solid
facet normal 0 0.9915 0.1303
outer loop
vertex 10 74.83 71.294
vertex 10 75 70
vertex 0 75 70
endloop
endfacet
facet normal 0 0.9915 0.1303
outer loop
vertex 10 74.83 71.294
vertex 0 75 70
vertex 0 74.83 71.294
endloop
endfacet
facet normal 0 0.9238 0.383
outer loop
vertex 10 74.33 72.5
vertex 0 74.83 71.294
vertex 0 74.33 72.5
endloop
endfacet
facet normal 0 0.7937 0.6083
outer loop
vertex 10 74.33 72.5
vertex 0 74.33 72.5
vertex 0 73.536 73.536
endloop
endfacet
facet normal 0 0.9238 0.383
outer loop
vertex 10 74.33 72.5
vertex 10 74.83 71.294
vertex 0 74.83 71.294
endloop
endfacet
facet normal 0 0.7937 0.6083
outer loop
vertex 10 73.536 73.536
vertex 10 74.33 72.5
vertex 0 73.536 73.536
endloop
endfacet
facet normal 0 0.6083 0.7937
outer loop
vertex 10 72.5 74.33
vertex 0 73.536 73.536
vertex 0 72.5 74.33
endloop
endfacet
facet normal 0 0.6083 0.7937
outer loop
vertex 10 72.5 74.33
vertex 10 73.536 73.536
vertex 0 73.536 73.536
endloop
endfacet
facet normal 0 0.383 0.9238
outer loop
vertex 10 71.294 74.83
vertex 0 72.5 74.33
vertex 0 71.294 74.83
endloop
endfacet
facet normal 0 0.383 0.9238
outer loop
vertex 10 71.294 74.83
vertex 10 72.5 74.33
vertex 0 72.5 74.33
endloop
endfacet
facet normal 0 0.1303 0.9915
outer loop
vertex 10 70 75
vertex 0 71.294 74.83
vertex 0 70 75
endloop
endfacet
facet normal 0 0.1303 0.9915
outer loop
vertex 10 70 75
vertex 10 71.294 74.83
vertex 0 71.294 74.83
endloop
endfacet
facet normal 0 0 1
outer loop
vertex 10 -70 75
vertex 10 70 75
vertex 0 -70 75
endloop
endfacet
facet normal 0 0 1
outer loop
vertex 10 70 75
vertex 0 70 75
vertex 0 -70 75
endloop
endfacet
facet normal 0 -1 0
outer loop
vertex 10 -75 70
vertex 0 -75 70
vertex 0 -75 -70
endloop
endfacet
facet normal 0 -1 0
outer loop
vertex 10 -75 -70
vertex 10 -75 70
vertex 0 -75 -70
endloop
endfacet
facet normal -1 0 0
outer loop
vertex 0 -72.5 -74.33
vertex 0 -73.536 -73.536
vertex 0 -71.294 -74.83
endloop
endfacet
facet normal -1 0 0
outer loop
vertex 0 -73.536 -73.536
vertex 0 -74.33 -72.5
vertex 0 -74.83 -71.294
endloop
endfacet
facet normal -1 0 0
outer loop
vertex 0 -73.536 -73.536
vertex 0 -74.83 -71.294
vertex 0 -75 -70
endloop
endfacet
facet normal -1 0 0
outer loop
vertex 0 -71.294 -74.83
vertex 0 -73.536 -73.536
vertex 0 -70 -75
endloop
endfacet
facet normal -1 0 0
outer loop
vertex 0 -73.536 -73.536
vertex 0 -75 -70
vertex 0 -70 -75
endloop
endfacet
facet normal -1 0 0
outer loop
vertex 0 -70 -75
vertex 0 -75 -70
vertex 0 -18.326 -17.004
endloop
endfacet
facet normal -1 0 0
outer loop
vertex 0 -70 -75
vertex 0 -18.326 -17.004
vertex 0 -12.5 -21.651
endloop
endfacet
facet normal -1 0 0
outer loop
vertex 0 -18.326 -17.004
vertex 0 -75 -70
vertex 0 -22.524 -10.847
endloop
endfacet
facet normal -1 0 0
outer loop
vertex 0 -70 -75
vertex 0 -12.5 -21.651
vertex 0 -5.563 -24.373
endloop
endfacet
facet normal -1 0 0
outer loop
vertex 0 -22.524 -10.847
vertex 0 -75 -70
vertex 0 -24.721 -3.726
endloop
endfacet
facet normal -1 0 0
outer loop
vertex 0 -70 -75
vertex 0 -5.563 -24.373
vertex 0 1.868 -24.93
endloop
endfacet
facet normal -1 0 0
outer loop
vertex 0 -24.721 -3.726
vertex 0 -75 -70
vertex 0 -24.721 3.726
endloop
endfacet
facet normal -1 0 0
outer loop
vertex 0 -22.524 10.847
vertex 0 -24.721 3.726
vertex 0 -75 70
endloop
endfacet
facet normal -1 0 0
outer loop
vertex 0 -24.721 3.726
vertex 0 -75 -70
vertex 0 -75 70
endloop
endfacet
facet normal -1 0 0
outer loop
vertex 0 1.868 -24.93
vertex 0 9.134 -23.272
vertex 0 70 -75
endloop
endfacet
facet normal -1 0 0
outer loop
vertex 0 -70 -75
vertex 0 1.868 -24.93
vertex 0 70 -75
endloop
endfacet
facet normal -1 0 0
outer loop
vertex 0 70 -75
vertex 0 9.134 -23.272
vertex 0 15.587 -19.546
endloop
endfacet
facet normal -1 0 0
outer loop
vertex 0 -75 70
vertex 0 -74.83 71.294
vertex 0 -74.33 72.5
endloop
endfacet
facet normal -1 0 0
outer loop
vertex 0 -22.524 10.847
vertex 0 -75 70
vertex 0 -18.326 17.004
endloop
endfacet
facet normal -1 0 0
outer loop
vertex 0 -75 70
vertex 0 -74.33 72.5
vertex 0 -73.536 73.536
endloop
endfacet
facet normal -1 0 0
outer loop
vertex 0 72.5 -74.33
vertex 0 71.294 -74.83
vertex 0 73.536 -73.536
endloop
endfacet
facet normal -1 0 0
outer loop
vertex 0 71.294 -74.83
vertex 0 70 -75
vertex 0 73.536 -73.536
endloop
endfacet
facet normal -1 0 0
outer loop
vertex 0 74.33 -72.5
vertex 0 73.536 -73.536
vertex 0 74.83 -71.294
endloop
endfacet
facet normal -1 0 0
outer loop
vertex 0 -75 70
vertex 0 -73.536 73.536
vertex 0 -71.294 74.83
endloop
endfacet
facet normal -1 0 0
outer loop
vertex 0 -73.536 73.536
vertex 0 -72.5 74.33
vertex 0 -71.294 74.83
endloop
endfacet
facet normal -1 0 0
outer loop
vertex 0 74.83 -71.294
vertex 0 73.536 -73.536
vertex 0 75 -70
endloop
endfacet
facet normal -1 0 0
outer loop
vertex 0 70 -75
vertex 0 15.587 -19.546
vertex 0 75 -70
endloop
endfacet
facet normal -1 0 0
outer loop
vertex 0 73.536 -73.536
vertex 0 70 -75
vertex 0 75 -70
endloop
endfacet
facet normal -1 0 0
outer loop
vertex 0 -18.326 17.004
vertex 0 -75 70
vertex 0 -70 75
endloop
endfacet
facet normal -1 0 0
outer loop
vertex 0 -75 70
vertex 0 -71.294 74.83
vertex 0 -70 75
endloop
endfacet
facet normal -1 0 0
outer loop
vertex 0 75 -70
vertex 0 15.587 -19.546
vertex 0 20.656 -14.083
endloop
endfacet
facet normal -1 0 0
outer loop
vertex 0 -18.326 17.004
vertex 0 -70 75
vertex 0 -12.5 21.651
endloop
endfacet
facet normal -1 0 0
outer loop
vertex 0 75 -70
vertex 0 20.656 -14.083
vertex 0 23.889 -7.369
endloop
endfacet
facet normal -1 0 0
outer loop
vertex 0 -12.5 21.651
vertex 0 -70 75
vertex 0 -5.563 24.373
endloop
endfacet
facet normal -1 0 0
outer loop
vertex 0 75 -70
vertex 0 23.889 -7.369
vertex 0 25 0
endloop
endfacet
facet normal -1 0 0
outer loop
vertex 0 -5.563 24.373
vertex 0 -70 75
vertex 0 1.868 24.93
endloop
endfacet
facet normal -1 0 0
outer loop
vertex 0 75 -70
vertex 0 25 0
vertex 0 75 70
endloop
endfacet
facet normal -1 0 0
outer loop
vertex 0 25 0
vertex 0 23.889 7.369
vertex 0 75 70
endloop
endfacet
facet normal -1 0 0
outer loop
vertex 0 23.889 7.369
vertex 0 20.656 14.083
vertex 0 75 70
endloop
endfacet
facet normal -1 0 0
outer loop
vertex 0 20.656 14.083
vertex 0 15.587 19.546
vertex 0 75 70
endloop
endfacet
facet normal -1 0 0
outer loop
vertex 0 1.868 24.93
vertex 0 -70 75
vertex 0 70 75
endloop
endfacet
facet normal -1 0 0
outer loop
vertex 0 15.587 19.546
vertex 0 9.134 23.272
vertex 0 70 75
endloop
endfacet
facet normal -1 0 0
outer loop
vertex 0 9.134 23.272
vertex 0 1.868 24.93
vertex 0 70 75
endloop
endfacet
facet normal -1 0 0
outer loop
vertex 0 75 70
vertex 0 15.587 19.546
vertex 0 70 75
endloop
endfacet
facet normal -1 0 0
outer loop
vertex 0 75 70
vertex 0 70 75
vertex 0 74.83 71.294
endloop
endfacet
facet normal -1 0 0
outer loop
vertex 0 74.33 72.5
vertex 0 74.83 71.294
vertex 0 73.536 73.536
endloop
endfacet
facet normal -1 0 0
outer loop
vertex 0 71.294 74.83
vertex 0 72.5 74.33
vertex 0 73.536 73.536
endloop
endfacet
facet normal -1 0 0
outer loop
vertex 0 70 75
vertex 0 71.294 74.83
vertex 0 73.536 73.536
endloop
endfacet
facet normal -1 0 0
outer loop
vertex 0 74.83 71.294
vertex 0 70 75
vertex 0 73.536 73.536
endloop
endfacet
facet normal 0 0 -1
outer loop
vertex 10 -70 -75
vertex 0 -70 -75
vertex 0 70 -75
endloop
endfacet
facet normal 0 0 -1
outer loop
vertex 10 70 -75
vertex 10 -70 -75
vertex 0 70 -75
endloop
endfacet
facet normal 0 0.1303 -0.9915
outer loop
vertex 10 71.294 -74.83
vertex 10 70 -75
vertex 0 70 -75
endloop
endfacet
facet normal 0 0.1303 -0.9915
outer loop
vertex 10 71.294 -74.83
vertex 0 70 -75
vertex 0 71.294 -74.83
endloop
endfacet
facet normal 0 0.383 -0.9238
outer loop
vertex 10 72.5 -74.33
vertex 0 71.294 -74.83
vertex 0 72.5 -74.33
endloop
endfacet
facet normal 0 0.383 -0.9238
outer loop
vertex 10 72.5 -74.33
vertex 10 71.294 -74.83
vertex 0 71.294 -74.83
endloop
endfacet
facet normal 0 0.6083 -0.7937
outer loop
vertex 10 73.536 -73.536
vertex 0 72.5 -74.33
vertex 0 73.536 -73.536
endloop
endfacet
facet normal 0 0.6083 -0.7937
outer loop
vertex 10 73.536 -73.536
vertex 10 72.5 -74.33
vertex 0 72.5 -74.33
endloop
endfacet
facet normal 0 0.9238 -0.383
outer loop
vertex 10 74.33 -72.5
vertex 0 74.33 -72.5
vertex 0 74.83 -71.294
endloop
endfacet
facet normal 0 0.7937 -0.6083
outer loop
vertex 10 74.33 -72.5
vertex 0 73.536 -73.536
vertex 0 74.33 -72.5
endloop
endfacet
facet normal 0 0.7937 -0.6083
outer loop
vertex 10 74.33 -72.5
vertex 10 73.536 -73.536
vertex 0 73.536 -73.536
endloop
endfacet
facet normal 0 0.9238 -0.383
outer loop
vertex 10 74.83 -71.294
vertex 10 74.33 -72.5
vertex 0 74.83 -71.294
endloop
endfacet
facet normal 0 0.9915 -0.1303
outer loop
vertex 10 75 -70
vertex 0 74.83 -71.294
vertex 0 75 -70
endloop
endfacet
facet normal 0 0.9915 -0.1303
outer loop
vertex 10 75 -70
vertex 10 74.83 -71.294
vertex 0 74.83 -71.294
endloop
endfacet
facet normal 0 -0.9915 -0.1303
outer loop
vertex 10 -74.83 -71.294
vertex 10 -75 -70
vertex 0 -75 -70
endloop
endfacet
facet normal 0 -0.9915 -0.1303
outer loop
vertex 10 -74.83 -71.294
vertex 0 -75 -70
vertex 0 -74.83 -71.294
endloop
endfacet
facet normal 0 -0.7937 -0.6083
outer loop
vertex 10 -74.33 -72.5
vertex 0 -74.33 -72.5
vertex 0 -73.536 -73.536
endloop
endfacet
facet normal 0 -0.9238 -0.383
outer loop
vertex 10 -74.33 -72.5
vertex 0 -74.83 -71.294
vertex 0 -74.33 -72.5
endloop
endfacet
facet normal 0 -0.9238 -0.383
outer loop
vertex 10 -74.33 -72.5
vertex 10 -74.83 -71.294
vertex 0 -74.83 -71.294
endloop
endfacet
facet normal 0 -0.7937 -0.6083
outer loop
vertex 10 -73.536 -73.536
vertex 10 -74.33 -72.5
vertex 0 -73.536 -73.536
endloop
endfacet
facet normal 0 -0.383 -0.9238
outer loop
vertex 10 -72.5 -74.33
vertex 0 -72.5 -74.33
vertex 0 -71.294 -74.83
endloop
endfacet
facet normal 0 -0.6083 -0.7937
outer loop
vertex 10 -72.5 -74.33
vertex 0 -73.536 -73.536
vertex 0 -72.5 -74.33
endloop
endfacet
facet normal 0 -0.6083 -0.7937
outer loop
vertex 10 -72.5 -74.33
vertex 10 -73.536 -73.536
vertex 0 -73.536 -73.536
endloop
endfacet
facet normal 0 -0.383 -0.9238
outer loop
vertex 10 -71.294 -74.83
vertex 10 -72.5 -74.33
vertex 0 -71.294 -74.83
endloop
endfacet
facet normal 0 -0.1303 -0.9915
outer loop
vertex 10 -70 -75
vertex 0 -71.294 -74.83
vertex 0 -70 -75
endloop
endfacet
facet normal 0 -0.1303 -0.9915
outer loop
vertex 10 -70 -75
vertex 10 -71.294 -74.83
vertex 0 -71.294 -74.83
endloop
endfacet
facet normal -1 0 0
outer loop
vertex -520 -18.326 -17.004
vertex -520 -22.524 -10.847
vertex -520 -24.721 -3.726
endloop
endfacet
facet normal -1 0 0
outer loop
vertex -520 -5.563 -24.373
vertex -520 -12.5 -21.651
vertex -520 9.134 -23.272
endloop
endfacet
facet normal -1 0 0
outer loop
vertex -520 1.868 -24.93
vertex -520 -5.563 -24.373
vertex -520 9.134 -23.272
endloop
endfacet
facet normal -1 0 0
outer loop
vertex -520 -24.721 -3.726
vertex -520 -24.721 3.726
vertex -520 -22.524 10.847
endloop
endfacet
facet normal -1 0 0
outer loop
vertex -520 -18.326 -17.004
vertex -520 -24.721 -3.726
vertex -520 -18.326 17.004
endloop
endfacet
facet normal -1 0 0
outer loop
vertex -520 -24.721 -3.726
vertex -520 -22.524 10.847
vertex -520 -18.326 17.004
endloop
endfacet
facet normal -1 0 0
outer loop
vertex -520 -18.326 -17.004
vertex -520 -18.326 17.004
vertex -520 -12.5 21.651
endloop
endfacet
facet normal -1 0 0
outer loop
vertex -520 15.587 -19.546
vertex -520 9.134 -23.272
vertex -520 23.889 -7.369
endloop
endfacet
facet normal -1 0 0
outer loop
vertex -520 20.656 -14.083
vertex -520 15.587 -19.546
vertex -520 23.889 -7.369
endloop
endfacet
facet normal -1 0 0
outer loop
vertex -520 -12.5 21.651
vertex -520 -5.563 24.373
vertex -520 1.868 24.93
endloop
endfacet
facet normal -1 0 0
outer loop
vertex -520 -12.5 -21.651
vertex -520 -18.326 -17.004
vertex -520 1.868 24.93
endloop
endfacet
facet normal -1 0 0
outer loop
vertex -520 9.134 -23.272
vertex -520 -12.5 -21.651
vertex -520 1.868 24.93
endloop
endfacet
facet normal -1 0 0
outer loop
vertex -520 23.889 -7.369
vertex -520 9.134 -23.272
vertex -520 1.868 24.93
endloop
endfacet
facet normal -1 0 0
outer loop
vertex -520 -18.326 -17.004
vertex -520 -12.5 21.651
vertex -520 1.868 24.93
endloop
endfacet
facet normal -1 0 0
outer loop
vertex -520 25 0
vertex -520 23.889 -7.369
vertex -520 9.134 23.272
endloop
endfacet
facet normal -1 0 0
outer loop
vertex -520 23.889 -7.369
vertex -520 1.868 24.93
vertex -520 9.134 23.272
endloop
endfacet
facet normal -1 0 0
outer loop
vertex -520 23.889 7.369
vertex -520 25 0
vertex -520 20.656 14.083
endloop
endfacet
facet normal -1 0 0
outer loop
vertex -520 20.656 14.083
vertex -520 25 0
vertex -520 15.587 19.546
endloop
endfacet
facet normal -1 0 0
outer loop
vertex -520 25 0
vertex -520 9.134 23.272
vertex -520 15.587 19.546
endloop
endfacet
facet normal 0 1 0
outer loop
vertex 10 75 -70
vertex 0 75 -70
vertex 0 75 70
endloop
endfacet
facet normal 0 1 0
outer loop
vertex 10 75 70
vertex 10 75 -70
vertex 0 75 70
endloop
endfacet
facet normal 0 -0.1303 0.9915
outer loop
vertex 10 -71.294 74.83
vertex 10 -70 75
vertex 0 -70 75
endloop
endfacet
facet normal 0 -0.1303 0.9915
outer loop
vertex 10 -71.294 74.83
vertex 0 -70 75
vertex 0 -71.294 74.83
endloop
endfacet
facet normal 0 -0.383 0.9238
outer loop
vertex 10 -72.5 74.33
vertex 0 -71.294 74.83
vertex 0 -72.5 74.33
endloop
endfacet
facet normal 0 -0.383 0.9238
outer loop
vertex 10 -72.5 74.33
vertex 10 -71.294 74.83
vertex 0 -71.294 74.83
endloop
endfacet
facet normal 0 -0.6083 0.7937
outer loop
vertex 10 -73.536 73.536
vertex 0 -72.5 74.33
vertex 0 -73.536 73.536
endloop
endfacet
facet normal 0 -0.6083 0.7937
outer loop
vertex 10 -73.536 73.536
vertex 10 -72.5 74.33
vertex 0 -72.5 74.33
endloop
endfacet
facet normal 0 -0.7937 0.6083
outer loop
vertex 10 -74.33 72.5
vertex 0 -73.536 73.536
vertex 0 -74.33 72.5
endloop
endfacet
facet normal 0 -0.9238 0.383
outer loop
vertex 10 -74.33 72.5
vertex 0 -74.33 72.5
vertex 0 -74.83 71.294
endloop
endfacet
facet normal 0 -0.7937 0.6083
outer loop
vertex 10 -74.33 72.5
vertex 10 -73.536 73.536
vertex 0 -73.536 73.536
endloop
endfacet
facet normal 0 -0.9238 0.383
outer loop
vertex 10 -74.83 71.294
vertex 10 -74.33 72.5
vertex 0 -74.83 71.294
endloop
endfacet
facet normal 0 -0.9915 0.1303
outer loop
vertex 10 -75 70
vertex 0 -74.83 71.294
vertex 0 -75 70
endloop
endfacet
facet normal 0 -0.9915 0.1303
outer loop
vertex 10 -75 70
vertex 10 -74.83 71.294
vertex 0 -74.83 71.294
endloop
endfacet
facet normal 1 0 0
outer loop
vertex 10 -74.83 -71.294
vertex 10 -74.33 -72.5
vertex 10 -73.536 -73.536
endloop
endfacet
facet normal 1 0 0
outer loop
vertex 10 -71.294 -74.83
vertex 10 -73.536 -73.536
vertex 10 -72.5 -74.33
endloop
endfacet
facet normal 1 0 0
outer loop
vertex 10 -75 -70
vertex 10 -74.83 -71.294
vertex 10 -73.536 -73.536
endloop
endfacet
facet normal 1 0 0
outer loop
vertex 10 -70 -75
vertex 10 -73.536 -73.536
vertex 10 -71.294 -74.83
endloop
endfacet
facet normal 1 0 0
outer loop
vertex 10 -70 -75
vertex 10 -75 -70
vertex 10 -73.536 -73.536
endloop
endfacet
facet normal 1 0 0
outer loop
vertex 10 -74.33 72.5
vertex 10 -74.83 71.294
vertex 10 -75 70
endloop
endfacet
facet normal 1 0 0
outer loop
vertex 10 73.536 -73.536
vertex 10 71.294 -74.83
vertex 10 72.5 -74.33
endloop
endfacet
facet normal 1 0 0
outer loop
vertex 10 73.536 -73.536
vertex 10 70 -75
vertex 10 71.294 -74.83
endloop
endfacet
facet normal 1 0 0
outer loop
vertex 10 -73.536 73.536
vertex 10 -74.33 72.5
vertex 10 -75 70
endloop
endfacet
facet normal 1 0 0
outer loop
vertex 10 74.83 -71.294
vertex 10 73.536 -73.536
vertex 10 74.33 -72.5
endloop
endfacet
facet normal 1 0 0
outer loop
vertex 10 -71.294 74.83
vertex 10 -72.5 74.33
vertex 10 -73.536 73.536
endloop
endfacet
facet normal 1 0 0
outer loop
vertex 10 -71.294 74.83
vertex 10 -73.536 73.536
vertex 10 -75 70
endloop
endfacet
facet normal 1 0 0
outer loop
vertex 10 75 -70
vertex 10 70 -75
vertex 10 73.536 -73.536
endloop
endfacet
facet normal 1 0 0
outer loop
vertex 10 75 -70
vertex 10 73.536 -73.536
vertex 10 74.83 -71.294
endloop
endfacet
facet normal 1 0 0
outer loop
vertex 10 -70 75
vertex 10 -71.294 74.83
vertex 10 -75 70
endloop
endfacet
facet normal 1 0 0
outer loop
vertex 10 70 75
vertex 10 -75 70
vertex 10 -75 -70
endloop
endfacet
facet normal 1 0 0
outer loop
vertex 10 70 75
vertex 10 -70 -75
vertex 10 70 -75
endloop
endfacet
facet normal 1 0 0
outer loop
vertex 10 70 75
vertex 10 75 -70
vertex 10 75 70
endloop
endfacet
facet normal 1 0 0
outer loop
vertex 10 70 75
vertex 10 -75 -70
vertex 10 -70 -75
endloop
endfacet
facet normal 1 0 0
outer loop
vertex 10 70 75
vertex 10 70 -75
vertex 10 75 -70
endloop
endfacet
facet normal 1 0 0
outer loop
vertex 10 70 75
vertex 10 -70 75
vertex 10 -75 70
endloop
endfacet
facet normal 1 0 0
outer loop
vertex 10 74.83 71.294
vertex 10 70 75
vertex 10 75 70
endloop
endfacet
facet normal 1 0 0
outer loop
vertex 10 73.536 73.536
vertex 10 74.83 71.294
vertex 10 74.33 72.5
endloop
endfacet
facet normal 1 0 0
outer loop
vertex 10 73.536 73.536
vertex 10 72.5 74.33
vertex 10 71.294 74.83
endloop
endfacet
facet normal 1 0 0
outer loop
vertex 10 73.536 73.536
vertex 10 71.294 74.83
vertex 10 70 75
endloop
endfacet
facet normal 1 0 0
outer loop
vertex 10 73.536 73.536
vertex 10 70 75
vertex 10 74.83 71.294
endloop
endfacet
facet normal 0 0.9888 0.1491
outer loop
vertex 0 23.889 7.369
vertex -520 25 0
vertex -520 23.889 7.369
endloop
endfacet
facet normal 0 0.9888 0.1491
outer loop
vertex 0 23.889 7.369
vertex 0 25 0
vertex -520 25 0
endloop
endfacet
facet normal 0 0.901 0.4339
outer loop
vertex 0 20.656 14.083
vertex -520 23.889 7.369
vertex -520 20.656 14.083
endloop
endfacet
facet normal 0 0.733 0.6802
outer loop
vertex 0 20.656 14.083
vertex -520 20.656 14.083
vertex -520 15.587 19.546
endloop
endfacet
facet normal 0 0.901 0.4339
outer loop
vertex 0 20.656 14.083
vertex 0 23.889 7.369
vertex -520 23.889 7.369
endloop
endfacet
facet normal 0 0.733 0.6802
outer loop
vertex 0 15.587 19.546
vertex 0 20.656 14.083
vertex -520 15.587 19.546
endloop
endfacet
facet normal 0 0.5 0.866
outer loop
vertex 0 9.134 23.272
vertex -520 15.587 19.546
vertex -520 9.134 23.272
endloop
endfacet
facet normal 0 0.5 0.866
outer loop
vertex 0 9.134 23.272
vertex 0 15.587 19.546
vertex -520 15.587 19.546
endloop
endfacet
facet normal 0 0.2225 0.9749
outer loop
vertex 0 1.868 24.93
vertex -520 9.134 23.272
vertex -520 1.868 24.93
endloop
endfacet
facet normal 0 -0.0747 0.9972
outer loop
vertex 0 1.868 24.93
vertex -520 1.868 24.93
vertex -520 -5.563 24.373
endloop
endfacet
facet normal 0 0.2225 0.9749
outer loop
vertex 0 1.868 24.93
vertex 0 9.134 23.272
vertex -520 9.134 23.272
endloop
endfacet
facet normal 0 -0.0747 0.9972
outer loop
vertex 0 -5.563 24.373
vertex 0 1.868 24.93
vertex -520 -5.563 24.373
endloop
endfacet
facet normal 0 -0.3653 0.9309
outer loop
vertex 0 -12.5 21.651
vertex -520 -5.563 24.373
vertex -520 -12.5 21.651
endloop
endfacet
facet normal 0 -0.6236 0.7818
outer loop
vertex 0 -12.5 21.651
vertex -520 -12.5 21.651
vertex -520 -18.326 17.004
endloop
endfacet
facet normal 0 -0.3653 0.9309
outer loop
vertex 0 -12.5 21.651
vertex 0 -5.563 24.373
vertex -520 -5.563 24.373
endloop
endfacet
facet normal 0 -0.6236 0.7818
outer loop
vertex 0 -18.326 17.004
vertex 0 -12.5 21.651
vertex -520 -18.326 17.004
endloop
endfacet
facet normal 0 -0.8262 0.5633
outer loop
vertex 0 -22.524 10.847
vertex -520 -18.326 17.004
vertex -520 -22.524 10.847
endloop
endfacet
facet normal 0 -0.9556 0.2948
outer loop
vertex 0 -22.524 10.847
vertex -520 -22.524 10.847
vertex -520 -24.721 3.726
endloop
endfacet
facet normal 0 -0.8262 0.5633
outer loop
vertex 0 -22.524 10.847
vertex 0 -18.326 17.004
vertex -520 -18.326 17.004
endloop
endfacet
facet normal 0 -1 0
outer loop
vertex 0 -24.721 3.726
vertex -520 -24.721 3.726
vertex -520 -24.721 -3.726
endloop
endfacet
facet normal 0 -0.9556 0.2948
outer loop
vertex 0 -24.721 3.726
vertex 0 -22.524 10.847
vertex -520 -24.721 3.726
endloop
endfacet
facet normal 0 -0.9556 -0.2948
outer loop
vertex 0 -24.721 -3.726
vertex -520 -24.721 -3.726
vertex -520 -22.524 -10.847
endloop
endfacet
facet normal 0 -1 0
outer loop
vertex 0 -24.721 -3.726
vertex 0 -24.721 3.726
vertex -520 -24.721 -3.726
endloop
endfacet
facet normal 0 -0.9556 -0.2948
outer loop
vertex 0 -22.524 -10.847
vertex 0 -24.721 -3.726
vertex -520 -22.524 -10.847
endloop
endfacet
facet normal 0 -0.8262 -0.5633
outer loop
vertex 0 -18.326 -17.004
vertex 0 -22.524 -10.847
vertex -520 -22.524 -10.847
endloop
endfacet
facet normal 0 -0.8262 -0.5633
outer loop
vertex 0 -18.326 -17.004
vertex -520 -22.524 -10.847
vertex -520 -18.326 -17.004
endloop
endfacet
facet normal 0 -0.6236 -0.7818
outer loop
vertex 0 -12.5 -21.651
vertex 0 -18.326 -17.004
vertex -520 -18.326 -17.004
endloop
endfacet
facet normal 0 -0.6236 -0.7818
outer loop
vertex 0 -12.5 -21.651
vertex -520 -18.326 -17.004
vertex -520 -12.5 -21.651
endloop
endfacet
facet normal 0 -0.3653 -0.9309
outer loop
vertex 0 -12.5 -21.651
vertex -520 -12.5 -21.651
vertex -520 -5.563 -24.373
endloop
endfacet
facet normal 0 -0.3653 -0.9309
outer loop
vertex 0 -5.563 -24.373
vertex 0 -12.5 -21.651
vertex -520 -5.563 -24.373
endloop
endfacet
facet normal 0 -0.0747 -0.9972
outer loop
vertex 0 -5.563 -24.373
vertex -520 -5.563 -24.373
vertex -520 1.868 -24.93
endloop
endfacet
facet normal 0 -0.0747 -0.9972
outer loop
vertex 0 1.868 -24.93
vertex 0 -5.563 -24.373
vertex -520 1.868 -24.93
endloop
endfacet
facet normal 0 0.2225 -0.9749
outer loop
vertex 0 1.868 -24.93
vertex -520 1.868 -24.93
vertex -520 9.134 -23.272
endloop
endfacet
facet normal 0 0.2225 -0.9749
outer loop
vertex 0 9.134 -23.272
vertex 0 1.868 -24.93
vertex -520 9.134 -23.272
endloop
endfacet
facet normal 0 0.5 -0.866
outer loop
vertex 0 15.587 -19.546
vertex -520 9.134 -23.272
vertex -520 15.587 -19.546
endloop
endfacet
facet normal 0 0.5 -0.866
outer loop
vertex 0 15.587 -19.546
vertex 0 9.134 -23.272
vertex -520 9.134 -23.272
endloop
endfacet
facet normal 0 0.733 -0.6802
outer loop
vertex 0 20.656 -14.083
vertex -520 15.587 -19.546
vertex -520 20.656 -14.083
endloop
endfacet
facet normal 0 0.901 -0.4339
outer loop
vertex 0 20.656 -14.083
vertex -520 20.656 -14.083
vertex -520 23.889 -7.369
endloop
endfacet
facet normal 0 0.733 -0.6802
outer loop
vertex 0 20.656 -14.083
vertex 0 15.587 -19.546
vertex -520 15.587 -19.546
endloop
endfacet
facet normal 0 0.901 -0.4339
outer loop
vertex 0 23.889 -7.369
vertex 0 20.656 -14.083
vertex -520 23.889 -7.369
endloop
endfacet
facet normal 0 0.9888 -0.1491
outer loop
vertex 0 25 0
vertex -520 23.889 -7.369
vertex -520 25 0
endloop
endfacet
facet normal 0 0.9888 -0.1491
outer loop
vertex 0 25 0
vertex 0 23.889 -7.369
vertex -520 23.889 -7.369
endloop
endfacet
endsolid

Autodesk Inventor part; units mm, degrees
ref_plane "YZ Plane" through (0, 0, 0) normal (1, 0, 0) x (0, 1, 0)
ref_plane "XZ Plane" through (0, 0, 0) normal (0, 1, 0) x (-1, 0, 0)
ref_plane "XY Plane" through (0, 0, 0) normal (0, 0, 1) x (1, 0, 0)
sketch "Sketch1" plane through (0, 0, 0) normal (1, 0, 0) x (0, 1, 0)
  circle A0 centre (0, 0) radius 25
  line L0 (75, 75) -> (-75, 75)
  line L1 (-75, 75) -> (-75, -75)
  line L2 (-75, -75) -> (75, -75)
  line L3 (75, -75) -> (75, 75)
  dimension "d0" = 50
  dimension "d1" = 150
  dimension "d2" = 150
extrude "Extrusion1" add sketch "Sketch1" along normal blind 10 contours A0 | L3 L2 L1 L0
extrude "Extrusion2" add sketch "Sketch1" against normal blind 520 contours A0
fillet "Fillet1" radius 5 4 edges at (5, 75, -75) (5, 75, 75) (5, -75, -75) (5, -75, 75)
properties part number "Embolo"
